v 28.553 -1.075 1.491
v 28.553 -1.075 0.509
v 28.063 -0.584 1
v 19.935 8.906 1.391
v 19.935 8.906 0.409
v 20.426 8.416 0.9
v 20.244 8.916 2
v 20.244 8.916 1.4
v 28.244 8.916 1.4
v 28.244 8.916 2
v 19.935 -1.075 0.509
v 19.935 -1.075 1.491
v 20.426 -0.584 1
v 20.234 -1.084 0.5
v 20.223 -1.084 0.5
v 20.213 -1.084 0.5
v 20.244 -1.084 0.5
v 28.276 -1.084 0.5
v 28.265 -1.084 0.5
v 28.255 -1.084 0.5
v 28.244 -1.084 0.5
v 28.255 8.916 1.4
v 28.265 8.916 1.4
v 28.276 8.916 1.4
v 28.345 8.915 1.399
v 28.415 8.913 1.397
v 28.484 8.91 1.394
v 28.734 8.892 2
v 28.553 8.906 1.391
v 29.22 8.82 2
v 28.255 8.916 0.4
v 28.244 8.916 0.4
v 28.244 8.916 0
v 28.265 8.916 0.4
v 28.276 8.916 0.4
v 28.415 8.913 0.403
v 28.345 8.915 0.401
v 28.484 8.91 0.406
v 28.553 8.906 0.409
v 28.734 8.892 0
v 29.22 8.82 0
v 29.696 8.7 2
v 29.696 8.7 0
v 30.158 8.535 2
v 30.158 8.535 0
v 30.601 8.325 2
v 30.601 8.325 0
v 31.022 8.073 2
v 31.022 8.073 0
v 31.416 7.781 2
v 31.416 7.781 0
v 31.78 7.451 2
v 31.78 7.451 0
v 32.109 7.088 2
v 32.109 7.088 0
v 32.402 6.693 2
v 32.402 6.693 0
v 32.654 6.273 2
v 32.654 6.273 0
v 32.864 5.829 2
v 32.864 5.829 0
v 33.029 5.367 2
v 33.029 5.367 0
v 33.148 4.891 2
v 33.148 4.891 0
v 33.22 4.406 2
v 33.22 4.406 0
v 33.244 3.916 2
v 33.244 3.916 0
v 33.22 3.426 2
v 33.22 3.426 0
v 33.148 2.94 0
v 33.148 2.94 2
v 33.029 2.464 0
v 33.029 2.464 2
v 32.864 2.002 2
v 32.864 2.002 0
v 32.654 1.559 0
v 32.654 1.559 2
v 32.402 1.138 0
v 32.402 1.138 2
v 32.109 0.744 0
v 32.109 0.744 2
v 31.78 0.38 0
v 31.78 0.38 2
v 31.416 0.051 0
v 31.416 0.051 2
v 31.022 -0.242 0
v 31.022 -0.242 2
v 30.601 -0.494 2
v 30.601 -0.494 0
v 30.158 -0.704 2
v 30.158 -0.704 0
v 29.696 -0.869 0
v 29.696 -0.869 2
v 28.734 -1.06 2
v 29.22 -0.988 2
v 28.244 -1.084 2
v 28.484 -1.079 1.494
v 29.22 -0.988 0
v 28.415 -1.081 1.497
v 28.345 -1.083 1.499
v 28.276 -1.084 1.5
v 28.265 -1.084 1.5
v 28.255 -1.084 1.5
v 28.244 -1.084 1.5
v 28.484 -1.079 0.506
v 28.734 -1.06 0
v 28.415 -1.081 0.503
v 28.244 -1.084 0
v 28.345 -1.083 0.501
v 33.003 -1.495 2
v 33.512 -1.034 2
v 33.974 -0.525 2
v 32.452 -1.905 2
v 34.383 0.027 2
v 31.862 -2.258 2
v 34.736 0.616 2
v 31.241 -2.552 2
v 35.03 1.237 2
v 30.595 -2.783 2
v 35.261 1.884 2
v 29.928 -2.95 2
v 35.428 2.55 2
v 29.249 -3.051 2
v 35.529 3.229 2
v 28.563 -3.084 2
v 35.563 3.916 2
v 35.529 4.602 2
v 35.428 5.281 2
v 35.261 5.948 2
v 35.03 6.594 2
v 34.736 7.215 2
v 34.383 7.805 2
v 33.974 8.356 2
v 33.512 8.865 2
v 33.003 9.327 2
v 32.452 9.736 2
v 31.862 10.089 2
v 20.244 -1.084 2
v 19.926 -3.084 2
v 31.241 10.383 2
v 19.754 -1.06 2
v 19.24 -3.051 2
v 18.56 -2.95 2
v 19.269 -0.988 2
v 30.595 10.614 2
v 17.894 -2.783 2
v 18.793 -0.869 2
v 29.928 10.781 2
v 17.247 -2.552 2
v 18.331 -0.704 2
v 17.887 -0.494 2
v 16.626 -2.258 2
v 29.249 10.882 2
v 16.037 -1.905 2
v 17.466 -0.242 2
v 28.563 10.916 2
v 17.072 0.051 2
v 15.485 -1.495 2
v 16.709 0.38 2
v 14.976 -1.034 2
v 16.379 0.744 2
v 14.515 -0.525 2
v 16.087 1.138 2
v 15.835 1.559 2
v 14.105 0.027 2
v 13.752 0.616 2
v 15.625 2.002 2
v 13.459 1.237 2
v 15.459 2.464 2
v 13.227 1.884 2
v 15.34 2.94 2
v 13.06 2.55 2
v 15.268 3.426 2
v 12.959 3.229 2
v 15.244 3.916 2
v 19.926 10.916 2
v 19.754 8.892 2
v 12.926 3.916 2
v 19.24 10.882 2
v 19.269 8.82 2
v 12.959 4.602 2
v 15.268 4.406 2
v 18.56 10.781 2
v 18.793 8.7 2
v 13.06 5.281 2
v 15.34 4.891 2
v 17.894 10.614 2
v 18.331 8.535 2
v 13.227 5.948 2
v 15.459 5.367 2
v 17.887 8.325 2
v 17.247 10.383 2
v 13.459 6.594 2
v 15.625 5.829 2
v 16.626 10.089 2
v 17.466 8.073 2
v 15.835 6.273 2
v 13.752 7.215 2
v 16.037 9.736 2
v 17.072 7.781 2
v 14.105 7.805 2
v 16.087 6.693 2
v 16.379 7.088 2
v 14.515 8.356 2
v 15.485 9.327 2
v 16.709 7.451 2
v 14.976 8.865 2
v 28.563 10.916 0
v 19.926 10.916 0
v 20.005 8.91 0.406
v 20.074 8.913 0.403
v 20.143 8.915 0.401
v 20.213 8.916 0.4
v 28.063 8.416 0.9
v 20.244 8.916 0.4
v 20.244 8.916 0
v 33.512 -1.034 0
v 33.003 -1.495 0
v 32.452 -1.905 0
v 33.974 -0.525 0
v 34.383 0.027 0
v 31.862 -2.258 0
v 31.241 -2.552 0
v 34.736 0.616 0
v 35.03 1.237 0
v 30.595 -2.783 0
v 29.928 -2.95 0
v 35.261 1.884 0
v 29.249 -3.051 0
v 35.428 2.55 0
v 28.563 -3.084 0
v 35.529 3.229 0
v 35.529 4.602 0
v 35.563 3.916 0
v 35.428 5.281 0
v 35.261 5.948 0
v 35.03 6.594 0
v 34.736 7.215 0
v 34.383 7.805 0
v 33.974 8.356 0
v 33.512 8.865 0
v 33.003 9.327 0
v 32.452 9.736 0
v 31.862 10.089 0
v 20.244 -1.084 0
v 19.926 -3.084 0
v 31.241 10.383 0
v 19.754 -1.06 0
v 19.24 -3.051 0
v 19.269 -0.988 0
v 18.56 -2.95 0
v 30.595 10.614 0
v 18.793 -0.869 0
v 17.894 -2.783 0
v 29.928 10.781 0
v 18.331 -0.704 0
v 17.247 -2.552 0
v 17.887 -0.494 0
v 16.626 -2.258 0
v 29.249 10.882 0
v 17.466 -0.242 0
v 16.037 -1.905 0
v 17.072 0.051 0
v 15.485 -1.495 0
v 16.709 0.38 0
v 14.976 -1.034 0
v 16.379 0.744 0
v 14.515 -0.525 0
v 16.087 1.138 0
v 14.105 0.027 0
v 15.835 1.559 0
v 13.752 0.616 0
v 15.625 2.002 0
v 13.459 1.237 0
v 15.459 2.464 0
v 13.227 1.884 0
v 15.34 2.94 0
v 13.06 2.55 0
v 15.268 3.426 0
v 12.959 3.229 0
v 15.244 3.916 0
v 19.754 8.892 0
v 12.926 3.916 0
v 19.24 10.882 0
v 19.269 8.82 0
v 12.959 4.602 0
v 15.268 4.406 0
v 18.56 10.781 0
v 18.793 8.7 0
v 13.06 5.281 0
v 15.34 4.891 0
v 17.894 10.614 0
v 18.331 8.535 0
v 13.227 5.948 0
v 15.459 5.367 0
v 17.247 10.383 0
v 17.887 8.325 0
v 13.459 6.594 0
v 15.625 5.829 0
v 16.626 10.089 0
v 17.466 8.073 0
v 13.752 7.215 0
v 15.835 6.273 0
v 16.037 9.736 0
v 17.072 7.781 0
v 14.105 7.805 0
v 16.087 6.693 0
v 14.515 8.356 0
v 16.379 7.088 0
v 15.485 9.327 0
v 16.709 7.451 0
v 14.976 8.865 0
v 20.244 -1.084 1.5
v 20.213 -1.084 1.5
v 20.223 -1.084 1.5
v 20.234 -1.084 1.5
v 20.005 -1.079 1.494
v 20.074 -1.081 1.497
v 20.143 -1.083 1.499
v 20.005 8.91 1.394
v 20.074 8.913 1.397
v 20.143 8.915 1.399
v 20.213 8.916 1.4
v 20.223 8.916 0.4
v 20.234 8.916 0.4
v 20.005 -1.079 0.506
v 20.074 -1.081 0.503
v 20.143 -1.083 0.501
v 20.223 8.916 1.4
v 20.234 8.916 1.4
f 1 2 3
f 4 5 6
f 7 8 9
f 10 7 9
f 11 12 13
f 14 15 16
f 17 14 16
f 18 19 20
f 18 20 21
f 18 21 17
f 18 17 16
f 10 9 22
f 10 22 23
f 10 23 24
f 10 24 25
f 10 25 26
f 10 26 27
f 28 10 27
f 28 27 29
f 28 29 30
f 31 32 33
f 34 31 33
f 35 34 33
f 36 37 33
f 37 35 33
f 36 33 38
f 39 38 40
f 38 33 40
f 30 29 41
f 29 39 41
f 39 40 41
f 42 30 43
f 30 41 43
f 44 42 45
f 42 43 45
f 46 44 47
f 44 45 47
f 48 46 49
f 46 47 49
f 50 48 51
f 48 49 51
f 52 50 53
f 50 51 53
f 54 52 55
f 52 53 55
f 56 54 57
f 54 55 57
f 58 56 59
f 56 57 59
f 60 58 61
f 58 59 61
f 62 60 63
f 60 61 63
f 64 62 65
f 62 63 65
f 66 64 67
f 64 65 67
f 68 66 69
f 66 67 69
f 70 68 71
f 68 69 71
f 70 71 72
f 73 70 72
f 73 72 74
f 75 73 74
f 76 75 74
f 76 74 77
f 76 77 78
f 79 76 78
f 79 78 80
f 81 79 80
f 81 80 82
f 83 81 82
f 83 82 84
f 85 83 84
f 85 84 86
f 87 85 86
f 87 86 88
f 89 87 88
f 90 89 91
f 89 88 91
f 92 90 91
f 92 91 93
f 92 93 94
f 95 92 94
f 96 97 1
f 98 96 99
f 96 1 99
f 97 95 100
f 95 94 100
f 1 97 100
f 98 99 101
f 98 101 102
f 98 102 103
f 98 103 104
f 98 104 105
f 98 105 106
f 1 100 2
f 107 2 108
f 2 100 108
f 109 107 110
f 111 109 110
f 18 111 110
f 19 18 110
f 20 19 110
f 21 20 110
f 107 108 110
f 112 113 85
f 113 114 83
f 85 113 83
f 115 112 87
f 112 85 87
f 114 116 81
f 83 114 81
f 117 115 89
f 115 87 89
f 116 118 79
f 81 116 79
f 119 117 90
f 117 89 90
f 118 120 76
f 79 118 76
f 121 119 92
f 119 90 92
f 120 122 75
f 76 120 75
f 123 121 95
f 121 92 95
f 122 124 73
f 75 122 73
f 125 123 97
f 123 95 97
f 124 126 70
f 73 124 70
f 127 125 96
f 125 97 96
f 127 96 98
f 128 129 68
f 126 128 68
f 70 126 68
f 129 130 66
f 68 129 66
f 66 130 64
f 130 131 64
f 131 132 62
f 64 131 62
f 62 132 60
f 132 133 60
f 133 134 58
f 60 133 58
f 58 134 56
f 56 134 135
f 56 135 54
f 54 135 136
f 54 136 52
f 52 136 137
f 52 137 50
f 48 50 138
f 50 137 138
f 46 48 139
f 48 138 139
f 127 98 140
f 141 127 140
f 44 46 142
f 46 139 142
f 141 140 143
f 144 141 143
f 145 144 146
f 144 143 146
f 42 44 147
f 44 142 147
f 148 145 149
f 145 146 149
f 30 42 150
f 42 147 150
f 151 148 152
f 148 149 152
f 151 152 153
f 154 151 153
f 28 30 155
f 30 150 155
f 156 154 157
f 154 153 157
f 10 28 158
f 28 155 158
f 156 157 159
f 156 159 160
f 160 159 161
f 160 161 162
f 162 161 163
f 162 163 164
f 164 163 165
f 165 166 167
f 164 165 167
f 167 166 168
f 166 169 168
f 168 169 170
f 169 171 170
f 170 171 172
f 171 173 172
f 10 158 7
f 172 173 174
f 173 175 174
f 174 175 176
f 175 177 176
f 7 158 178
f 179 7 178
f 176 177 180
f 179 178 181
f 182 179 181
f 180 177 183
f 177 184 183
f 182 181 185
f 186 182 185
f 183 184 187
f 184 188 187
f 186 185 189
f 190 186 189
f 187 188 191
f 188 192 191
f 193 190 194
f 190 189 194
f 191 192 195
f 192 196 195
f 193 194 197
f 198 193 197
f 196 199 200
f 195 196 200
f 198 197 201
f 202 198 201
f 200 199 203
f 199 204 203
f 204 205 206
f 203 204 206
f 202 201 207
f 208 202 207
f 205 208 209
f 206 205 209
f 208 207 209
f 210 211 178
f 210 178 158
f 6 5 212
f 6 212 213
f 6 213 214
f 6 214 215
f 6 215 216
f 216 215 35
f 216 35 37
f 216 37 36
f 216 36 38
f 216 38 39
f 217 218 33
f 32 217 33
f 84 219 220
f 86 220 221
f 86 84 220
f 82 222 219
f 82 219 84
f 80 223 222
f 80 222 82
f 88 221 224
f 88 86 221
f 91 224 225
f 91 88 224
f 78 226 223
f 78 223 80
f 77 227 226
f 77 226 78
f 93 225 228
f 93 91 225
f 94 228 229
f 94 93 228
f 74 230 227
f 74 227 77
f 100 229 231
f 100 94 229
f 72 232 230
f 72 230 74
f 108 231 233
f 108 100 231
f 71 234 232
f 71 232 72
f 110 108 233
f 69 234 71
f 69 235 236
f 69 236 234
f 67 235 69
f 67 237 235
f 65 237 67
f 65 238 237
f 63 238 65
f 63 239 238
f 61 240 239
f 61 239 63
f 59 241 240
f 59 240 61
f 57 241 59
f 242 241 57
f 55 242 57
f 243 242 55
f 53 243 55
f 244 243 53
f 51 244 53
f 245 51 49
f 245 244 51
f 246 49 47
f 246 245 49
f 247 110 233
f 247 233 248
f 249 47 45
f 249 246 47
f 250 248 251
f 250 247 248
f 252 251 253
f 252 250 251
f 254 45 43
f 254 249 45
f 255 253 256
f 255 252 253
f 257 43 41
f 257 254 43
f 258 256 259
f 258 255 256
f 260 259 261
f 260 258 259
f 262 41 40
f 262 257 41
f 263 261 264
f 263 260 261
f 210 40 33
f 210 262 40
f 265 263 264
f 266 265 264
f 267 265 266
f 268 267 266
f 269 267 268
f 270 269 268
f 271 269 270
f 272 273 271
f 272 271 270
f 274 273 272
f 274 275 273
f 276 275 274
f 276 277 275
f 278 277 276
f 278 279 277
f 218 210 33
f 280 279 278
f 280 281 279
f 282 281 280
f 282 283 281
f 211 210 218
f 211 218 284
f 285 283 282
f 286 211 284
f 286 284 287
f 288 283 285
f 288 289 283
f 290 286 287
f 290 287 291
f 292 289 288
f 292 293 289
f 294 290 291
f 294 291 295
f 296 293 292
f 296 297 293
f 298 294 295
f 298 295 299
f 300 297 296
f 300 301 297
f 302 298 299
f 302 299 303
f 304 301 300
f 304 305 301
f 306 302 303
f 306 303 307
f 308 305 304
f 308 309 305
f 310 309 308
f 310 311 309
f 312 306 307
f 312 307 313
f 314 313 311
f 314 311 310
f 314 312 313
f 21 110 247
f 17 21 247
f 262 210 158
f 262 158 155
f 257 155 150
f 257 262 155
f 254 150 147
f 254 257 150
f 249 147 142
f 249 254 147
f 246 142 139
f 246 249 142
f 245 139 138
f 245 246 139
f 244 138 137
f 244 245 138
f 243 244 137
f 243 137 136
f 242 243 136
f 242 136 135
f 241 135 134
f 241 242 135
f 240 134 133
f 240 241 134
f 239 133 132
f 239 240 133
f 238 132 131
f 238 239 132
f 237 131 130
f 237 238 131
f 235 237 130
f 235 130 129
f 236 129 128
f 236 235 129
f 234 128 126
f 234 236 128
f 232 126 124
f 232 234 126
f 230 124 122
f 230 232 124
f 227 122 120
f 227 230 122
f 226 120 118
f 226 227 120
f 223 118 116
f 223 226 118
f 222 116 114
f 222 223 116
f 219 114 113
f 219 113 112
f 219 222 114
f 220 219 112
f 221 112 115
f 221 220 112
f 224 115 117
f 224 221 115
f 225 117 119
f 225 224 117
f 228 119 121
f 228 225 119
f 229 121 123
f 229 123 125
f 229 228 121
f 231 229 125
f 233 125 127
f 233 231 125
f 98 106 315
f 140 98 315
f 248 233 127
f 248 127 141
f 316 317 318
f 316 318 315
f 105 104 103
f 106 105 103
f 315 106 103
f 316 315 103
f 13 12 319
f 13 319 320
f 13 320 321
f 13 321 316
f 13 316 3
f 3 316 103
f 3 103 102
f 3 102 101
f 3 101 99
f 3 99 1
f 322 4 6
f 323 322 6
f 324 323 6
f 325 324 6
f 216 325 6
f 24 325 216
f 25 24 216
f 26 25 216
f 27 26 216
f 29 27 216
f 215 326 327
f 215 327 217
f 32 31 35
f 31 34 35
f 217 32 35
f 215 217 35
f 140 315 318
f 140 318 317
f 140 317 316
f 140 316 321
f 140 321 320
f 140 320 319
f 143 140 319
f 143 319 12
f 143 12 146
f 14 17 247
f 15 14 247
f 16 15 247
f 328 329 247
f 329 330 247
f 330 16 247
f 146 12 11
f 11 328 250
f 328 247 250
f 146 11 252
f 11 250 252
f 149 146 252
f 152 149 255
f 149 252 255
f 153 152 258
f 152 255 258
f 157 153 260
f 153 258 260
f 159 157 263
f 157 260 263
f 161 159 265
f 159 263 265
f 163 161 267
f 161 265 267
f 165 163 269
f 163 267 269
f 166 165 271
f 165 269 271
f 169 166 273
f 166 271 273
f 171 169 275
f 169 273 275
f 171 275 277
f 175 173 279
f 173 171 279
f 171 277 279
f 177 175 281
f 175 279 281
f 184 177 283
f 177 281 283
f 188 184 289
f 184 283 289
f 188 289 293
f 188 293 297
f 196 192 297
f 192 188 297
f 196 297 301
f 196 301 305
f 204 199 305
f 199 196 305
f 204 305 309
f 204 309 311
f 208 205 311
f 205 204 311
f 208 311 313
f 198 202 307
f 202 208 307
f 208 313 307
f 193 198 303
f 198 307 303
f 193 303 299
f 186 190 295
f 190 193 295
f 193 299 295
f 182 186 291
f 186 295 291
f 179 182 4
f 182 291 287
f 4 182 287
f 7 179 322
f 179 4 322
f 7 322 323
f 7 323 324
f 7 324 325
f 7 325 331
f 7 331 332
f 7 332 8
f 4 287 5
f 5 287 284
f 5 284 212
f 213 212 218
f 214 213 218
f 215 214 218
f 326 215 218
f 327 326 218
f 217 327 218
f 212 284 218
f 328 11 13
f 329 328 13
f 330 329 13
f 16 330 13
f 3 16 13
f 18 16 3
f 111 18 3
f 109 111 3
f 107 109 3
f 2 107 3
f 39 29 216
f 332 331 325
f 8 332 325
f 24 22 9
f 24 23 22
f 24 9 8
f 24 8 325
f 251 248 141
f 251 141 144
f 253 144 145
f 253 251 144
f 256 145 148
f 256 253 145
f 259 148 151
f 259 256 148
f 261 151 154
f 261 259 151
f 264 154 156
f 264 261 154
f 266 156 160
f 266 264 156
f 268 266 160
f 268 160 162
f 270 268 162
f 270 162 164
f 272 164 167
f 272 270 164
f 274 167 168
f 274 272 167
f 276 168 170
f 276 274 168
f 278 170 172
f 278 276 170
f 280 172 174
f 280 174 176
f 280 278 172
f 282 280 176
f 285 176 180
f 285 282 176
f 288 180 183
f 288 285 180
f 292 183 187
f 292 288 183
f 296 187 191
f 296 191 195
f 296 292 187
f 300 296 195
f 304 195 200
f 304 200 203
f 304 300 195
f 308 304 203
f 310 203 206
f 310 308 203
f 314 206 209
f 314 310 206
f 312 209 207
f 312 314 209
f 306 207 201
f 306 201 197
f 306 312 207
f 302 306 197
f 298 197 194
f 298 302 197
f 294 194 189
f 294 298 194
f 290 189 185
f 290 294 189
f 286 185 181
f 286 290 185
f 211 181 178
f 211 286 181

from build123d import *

# Parameters (mm, degrees)
BASEBOSS_EXTRUDE1_DEPTH = 2
SKETCH3_W               = 8.636942675
SKETCH3_H               = 1
BOSS_EXTRUDE1_DEPTH     = 0.5
SKETCH4_W               = 8.636942675
SKETCH4_H               = 1
BOSS_EXTRUDE2_DEPTH     = 0.5
CHAMFER1_SIZE           = 0.5
CHAMFER2_SIZE           = 0.5


# Some blends are built 0.0001 mm under size
with BuildPart() as part:
    # Sketch1 → BaseBoss-Extrude1 (new body)
    with BuildSketch(Plane.XY):
        with BuildLine():
            Line((19.925716198, 10.915607247), (28.562658873, 10.915607247))
            ThreePointArc((28.562658873, 10.915607247), (35.562658873, 3.915607247), (28.562658873, -3.084392753))
            Line((28.562658873, -3.084392753), (19.925716198, -3.084392753))
            ThreePointArc((19.925716198, -3.084392753), (12.925716198, 3.915607247), (19.925716198, 10.915607247))
        make_face()
        with BuildLine():
            Line((20.244187536, 8.915607247), (28.244187536, 8.915607247))
            ThreePointArc((28.244187536, 8.915607247), (33.244187536, 3.915607247), (28.244187536, -1.084392753))
            Line((28.244187536, -1.084392753), (20.244187536, -1.084392753))
            ThreePointArc((20.244187536, -1.084392753), (15.244187536, 3.915607247), (20.244187536, 8.915607247))
        make_face(mode=Mode.SUBTRACT)
    extrude(amount=BASEBOSS_EXTRUDE1_DEPTH)

    # Sketch3 → Boss-Extrude1 (add)
    with BuildSketch(Plane.XZ.offset(-8.915607247)):
        with Locations((24.244187536, 0.9)):
            Rectangle(SKETCH3_W, SKETCH3_H)
    extrude(amount=BOSS_EXTRUDE1_DEPTH)

    # Sketch4 → Boss-Extrude2 (add)
    with BuildSketch(Plane(origin=(0, -1.084392753, 0), x_dir=(1, 0, 0), z_dir=(0, 1, 0))):
        with Locations((24.244187536, -1)):
            Rectangle(SKETCH4_W, SKETCH4_H)
    extrude(amount=BOSS_EXTRUDE2_DEPTH)

    # Chamfer1
    # the kernel refuses this chamfer: 0.5 mm, written as the material it takes off along each edge
    with BuildSketch(Plane(origin=(28.562658873, -0.584392753, -0.785841494), x_dir=(0.02749587661058907, -0.9996219169112965, 0), z_dir=(0, 0, 1))) as chamfer1_piece_1_section:
        Polygon((CHAMFER1_SIZE * 0.999621916911, -CHAMFER1_SIZE * 0.0274958766106), (-CHAMFER1_SIZE * 0.0274958766106, -CHAMFER1_SIZE * 0.999621916911), (0, 0), align=None)
    chamfer1_piece_1 = extrude(amount=3.571682988, mode=Mode.PRIVATE)
    chamfer1_piece_1 = chamfer1_piece_1 & Plane(origin=(28.244187536, 3.915607247, 1), x_dir=(0, 1, 0), z_dir=(0, 0, -1)) * Cylinder(5, 10, mode=Mode.PRIVATE)
    add(chamfer1_piece_1, mode=Mode.SUBTRACT)
    with BuildSketch(Plane(origin=(19.925716198, -0.584392753, 2.785841494), x_dir=(-0.02749587661058907, -0.9996219169112965, 0), z_dir=(0, 0, -1))) as chamfer1_piece_2_section:
        Polygon((CHAMFER1_SIZE * 0.999621916911, -CHAMFER1_SIZE * 0.0274958766106), (-CHAMFER1_SIZE * 0.0274958766106, -CHAMFER1_SIZE * 0.999621916911), (0, 0), align=None)
    chamfer1_piece_2 = extrude(amount=3.571682988, mode=Mode.PRIVATE)
    chamfer1_piece_2 = chamfer1_piece_2 & Plane(origin=(20.244187536, 3.915607247, 1), x_dir=(0, -1, 0), z_dir=(0, 0, -1)) * Cylinder(5, 10, mode=Mode.PRIVATE)
    add(chamfer1_piece_2, mode=Mode.SUBTRACT)
    with BuildSketch(Plane(origin=(28.562658873, 8.415607247, 2.685841494), x_dir=(0.0274958766105891, 0.9996219169112968, 0), z_dir=(0, 0, -1))) as chamfer1_piece_3_section:
        Polygon((CHAMFER1_SIZE * 0.999621916911, -CHAMFER1_SIZE * 0.0274958766106), (-CHAMFER1_SIZE * 0.0274958766106, -CHAMFER1_SIZE * 0.999621916911), (0, 0), align=None)
    chamfer1_piece_3 = extrude(amount=3.571682988, mode=Mode.PRIVATE)
    chamfer1_piece_3 = chamfer1_piece_3 & Plane(origin=(28.244187536, 3.915607247, 0.9), x_dir=(0, 1, 0), z_dir=(0, 0, -1)) * Cylinder(5, 10, mode=Mode.PRIVATE)
    add(chamfer1_piece_3, mode=Mode.SUBTRACT)
    with BuildSketch(Plane(origin=(19.925716198, 8.415607247, -0.885841494), x_dir=(-0.0274958766105891, 0.9996219169112968, 0), z_dir=(0, 0, 1))) as chamfer1_piece_4_section:
        Polygon((CHAMFER1_SIZE * 0.999621916911, -CHAMFER1_SIZE * 0.0274958766106), (-CHAMFER1_SIZE * 0.0274958766106, -CHAMFER1_SIZE * 0.999621916911), (0, 0), align=None)
    chamfer1_piece_4 = extrude(amount=3.571682988, mode=Mode.PRIVATE)
    chamfer1_piece_4 = chamfer1_piece_4 & Plane(origin=(20.244187536, 3.915607247, 0.9), x_dir=(0, -1, 0), z_dir=(0, 0, -1)) * Cylinder(5, 10, mode=Mode.PRIVATE)
    add(chamfer1_piece_4, mode=Mode.SUBTRACT)

    # Chamfer2
    chamfer2_edges = [part.edges().sort_by_distance(p)[0] for p in [
        (24.244187536, -0.584392753, 0.5),
        (24.244187536, 8.415607247, 0.4),
        (24.244187536, 8.415607247, 1.4),
        (24.244187536, -0.584392753, 1.5),
    ]]
    chamfer(chamfer2_edges, length=CHAMFER2_SIZE - 0.0001)  # a hair under: the kernel refuses the full size


solid = part.part
